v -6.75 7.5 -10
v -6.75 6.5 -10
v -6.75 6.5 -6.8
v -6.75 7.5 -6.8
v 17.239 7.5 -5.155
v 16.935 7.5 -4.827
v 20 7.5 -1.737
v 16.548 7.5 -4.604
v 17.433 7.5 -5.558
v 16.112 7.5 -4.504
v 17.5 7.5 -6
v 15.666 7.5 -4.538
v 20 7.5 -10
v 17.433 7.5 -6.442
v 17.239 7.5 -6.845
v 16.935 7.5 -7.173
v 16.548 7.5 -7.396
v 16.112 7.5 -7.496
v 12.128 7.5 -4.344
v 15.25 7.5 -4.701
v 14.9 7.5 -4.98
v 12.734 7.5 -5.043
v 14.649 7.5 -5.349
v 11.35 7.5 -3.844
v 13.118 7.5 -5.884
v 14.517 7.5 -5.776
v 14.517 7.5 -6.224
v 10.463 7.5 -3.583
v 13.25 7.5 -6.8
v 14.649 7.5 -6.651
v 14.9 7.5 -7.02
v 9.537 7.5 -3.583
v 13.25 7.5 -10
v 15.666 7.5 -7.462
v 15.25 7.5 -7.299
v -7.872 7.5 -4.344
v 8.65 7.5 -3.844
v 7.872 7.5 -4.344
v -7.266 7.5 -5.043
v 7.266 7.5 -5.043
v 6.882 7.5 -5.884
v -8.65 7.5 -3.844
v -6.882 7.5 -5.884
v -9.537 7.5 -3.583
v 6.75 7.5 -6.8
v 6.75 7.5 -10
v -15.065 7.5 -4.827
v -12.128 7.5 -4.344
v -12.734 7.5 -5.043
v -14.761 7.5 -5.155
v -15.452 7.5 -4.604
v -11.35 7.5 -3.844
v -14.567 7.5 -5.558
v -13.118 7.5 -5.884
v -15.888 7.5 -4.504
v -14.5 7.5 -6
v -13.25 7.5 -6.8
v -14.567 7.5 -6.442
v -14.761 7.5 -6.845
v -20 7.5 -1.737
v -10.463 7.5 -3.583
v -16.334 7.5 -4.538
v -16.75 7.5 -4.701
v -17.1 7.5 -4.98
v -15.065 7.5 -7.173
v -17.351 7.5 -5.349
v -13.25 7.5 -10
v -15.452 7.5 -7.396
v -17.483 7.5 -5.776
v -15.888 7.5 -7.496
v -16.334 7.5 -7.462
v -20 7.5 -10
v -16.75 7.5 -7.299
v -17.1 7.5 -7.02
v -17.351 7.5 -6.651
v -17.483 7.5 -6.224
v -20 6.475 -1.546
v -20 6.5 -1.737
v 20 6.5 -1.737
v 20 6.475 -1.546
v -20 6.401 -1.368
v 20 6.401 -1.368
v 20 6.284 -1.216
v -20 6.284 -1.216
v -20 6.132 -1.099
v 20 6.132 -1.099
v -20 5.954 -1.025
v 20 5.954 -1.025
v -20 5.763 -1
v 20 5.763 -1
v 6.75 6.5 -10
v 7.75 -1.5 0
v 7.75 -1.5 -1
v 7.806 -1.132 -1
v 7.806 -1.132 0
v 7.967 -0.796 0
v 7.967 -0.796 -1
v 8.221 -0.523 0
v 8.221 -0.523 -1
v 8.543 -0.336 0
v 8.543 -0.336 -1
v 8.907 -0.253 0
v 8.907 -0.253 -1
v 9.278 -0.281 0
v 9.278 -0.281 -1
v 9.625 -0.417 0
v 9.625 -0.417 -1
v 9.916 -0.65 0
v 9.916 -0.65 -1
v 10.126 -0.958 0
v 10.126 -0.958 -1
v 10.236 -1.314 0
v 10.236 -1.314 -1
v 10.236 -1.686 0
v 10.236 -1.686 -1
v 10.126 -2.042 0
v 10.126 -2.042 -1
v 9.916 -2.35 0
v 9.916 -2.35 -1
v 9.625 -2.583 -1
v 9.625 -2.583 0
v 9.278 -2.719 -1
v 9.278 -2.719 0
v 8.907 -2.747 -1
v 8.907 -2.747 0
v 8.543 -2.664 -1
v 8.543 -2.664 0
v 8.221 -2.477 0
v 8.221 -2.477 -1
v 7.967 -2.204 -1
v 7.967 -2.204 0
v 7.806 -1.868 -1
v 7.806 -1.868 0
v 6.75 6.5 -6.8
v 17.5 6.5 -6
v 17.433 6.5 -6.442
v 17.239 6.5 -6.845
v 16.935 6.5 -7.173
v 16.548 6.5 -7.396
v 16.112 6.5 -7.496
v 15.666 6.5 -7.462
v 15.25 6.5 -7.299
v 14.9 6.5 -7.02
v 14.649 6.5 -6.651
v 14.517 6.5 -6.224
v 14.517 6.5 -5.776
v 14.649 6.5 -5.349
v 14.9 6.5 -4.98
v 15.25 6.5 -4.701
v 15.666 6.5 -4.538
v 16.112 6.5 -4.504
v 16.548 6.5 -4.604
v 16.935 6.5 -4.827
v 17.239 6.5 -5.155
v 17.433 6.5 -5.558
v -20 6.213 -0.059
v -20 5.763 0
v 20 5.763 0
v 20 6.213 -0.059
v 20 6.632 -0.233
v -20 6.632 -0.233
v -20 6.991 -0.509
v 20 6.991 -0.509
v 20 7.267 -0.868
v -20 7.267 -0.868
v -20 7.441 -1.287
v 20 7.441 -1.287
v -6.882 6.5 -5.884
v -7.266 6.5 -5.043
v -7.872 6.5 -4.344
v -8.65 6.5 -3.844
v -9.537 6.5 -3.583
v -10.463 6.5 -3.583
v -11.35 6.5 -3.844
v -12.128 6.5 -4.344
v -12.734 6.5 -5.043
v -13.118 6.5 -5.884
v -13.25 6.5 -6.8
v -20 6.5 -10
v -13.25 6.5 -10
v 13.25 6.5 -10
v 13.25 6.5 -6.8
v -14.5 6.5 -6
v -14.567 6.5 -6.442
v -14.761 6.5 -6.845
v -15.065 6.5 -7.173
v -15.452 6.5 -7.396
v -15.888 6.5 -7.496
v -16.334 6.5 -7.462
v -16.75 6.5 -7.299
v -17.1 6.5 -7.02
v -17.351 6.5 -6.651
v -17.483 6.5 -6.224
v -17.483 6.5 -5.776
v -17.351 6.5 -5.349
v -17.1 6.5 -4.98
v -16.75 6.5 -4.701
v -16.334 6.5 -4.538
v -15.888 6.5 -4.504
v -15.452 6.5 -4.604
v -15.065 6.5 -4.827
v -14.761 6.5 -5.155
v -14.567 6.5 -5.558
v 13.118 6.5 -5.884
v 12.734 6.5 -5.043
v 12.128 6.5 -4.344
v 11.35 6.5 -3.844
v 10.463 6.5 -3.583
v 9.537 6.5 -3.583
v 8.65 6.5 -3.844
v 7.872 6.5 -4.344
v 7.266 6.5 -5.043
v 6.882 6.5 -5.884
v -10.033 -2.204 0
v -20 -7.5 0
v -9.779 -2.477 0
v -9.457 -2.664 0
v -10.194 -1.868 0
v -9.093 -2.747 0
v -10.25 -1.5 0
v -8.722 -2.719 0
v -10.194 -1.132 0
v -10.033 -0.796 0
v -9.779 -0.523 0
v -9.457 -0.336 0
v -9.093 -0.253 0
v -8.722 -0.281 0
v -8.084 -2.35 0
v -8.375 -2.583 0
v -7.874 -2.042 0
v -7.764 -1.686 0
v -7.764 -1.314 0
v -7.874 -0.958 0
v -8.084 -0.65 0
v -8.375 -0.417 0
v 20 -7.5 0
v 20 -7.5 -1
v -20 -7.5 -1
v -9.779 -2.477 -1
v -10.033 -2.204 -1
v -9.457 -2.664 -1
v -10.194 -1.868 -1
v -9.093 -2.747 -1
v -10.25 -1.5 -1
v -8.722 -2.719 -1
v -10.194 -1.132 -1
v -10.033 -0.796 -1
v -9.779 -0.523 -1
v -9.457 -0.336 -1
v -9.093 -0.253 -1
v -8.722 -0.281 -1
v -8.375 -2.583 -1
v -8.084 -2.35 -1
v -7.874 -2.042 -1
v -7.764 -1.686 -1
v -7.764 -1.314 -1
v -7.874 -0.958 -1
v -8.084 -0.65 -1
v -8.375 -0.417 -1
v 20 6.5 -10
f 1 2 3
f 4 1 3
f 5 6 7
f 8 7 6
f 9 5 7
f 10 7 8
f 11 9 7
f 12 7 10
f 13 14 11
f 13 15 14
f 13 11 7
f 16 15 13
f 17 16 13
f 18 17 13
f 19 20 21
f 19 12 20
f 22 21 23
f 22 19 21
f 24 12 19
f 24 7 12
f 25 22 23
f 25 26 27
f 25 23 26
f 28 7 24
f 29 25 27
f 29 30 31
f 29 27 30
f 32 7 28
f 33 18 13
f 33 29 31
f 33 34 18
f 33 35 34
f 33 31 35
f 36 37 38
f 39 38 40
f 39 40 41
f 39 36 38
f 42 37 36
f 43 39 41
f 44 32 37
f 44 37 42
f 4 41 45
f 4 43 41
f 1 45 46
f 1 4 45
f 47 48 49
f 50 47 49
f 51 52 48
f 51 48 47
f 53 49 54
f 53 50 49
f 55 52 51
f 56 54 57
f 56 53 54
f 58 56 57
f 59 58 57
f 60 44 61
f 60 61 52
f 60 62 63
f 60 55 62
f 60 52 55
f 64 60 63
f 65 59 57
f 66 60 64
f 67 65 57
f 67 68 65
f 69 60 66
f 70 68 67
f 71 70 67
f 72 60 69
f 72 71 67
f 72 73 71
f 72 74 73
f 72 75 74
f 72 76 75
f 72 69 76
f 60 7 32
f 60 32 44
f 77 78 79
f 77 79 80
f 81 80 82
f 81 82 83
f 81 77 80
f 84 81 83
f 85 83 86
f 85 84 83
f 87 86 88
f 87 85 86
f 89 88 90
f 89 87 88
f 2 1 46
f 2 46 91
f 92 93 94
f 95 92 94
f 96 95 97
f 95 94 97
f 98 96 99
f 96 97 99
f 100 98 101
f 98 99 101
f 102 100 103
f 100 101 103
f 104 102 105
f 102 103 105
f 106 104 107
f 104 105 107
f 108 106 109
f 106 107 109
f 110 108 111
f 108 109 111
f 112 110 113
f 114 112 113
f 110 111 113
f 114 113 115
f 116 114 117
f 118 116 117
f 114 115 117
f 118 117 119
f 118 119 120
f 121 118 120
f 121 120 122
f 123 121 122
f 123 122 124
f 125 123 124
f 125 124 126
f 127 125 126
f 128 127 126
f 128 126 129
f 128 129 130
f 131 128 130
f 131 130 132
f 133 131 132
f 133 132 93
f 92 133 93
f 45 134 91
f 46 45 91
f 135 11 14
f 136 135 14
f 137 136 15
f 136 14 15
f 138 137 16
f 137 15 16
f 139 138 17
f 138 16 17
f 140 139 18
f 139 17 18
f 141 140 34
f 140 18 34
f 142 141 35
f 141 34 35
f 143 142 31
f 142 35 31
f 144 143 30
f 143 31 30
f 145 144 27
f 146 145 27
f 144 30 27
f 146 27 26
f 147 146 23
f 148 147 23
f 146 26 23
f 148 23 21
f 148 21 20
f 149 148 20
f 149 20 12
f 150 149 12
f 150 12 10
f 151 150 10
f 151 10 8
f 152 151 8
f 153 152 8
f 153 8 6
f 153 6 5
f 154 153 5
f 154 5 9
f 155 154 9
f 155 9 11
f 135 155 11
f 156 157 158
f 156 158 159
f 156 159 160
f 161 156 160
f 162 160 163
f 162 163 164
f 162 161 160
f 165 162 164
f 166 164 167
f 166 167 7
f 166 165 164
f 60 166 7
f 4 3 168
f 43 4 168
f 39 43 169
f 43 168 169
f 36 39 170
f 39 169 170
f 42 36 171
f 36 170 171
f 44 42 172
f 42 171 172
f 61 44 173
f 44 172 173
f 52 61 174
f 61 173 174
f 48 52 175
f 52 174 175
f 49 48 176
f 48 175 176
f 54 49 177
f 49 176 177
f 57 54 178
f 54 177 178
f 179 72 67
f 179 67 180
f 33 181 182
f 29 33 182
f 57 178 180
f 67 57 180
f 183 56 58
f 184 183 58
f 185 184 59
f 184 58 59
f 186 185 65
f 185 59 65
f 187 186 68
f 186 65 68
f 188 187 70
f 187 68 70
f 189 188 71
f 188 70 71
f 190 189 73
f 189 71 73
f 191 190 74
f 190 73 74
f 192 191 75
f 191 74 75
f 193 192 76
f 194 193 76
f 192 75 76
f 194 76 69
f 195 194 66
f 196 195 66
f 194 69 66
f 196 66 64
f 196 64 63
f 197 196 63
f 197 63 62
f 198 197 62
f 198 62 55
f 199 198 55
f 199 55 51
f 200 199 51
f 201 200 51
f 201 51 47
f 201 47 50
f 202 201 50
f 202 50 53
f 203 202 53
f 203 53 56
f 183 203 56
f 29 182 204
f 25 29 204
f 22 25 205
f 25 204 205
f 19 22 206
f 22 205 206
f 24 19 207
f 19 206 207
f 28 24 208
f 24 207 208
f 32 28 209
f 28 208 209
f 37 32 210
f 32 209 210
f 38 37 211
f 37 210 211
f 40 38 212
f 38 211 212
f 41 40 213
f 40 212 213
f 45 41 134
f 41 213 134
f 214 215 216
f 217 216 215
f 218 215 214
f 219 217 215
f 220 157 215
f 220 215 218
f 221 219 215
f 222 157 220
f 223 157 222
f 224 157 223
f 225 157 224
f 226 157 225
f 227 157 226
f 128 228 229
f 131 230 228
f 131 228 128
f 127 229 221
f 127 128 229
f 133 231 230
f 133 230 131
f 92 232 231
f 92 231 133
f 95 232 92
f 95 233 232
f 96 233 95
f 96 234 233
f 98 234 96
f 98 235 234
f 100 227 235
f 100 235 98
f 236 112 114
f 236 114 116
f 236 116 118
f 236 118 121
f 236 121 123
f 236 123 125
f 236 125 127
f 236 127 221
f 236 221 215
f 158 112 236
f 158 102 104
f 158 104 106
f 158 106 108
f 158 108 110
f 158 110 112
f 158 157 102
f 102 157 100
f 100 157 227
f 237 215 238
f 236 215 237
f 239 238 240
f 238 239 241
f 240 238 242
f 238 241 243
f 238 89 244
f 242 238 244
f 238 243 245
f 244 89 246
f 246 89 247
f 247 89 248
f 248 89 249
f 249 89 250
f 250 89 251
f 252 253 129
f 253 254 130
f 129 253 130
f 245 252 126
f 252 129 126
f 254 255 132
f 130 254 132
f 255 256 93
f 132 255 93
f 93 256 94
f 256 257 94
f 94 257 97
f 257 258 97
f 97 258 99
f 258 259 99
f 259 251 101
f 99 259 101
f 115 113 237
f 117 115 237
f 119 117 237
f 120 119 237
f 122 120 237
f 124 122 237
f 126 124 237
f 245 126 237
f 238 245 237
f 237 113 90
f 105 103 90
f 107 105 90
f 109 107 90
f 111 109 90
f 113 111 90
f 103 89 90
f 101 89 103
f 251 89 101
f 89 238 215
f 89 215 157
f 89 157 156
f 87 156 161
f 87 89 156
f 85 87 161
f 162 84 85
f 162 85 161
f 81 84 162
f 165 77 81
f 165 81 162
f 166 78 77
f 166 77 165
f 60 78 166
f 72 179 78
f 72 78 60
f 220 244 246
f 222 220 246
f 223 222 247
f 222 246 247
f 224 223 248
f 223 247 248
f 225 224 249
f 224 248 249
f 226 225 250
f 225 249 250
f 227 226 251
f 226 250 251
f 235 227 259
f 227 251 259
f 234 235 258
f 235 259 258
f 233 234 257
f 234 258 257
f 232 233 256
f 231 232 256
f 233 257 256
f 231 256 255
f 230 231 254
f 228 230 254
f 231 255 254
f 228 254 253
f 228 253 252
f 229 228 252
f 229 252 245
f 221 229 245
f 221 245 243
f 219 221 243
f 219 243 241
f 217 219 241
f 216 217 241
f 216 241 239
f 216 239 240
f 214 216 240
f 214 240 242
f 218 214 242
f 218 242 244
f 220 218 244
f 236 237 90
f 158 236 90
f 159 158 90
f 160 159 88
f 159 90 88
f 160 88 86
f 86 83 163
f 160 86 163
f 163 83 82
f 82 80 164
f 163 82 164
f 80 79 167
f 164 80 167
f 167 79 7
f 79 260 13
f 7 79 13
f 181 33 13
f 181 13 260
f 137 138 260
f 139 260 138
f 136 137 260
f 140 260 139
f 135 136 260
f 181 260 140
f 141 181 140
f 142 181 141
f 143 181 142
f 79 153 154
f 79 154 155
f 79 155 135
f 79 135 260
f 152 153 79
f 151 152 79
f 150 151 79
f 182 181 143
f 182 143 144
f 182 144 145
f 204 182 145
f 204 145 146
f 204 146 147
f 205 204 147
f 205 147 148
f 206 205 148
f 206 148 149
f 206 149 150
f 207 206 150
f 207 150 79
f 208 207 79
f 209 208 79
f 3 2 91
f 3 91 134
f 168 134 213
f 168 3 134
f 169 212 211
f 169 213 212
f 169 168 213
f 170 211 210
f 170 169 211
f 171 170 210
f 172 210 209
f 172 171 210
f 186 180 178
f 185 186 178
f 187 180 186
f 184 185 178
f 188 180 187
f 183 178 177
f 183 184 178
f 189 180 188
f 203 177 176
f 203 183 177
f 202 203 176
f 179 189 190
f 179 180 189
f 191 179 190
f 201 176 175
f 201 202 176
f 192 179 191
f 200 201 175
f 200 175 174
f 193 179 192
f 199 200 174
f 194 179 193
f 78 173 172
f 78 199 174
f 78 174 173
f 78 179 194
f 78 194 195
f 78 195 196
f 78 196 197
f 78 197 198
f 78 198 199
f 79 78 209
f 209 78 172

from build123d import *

# Parameters (mm, degrees)
SZKIC1_W                           = 40
SZKIC1_H                           = 15
ODGI_CIE_BAZOWE1_DEPTH             = 1
ODGI_CIE_KRAW_DZI1_STRIP_W         = 5.4732
ODGI_CIE_KRAW_DZI1_STRIP_H         = 1
ODGI_CIE_KRAW_DZI1_STRIP_CUT_DEPTH = 40
ODGI_CIE_KRAW_DZI1_DEPTH           = 40
OTW_R_GWINTOWANY_M3X0_51_D         = 2.5
WYTNIJ_WYCI_GNI_CIE1_DEPTH         = 27.381811917
OTWORY_USTALAJ_CE_3_0MM1_D         = 3


# Sheet-metal steps are written as plain solids
with BuildPart() as part:
    # Szkic1 → Odgięcie bazowe1 (new body)
    with BuildSketch(Plane.XY):
        Rectangle(SZKIC1_W, SZKIC1_H)
    extrude(amount=-ODGI_CIE_BAZOWE1_DEPTH)

    # Odgięcie krawędzi1 strip (across the edge) → Odgięcie krawędzi1 strip cut (cut)
    with BuildSketch(Plane(origin=(-20, 7.5, -1), x_dir=(0, -1, 0), z_dir=(1, 0, 0))):
        with Locations((-1, -0.5)):
            Rectangle(ODGI_CIE_KRAW_DZI1_STRIP_W, ODGI_CIE_KRAW_DZI1_STRIP_H)
    extrude(amount=ODGI_CIE_KRAW_DZI1_STRIP_CUT_DEPTH, mode=Mode.SUBTRACT)

    # Odgięcie krawędzi1 section (across the edge) → Odgięcie krawędzi1 (add)
    with BuildSketch(Plane(origin=(-20, 7.5, -1), x_dir=(0, -1, 0), z_dir=(1, 0, 0))):
        with BuildLine():
            Line((0, 0.7366), (0, 9))
            Line((0, 9), (1, 9))
            Line((1, 9), (1, 0.7366))
            ThreePointArc((1, 0.7366), (1.215745145, 0.215745145), (1.7366, 0))
            Line((1.7366, 0), (1.7366, -1))
            ThreePointArc((1.7366, -1), (0.508638364, -0.491361636), (0, 0.7366))
        make_face()
    extrude(amount=ODGI_CIE_KRAW_DZI1_DEPTH)

    # Otwór gwintowany M3x0.51 (through all)
    with Locations(Plane.XY):
        with Locations((-9, -1.5), (9, -1.5)):
            Hole(OTW_R_GWINTOWANY_M3X0_51_D / 2)

    # Szkic11 → Wytnij-wyciągnięcie1 (cut, through all)
    with BuildSketch(Plane.XZ.offset(-6.5)):
        with BuildLine():
            ThreePointArc((-10.567890835, -10), (-12.490797584, -8.887684697), (-13.25, -6.8))
            Line((-13.25, -6.8), (-13.25, -10))
            Line((-13.25, -10), (-10.567890835, -10))
        make_face()
        with BuildLine():
            Line((-6.75, -10), (-6.75, -6.8))
            ThreePointArc((-6.75, -6.8), (-7.509202416, -8.887684697), (-9.432109165, -10))
            Line((-9.432109165, -10), (-6.75, -10))
        make_face()
        with BuildLine():
            ThreePointArc((-6.75, -6.8), (-10, -3.55), (-13.25, -6.8))
            ThreePointArc((-13.25, -6.8), (-12.490797584, -8.887684697), (-10.567890835, -10))
            Line((-10.567890835, -10), (-9.432109165, -10))
            ThreePointArc((-9.432109165, -10), (-7.509202416, -8.887684697), (-6.75, -6.8))
        make_face()
        with BuildLine():
            Line((-9.432109165, -10), (-10.567890835, -10))
            ThreePointArc((-10.567890835, -10), (-10, -10.05), (-9.432109165, -10))
        make_face()
        with BuildLine():
            ThreePointArc((13.25, -6.8), (10, -3.55), (6.75, -6.8))
            ThreePointArc((6.75, -6.8), (7.509202416, -8.887684697), (9.432109165, -10))
            Line((9.432109165, -10), (10.567890835, -10))
            ThreePointArc((10.567890835, -10), (12.490797584, -8.887684697), (13.25, -6.8))
        make_face()
        with BuildLine():
            Line((10.567890835, -10), (9.432109165, -10))
            ThreePointArc((9.432109165, -10), (10, -10.05), (10.567890835, -10))
        make_face()
        with BuildLine():
            Line((6.75, -6.8), (6.75, -10))
            Line((6.75, -10), (9.432109165, -10))
            ThreePointArc((9.432109165, -10), (7.509202416, -8.887684697), (6.75, -6.8))
        make_face()
        with BuildLine():
            Line((13.25, -10), (13.25, -6.8))
            ThreePointArc((13.25, -6.8), (12.490797584, -8.887684697), (10.567890835, -10))
            Line((10.567890835, -10), (13.25, -10))
        make_face()
    extrude(amount=-WYTNIJ_WYCI_GNI_CIE1_DEPTH, mode=Mode.SUBTRACT)

    # Otwory ustalające Ø3.0mm1 (through all)
    with Locations(Plane(origin=(0, 6.5, 0), x_dir=(-1, 0, 0), z_dir=(0, -1, 0))):
        with Locations((16, 6), (-16, 6)):
            Hole(OTWORY_USTALAJ_CE_3_0MM1_D / 2)


solid = part.part
